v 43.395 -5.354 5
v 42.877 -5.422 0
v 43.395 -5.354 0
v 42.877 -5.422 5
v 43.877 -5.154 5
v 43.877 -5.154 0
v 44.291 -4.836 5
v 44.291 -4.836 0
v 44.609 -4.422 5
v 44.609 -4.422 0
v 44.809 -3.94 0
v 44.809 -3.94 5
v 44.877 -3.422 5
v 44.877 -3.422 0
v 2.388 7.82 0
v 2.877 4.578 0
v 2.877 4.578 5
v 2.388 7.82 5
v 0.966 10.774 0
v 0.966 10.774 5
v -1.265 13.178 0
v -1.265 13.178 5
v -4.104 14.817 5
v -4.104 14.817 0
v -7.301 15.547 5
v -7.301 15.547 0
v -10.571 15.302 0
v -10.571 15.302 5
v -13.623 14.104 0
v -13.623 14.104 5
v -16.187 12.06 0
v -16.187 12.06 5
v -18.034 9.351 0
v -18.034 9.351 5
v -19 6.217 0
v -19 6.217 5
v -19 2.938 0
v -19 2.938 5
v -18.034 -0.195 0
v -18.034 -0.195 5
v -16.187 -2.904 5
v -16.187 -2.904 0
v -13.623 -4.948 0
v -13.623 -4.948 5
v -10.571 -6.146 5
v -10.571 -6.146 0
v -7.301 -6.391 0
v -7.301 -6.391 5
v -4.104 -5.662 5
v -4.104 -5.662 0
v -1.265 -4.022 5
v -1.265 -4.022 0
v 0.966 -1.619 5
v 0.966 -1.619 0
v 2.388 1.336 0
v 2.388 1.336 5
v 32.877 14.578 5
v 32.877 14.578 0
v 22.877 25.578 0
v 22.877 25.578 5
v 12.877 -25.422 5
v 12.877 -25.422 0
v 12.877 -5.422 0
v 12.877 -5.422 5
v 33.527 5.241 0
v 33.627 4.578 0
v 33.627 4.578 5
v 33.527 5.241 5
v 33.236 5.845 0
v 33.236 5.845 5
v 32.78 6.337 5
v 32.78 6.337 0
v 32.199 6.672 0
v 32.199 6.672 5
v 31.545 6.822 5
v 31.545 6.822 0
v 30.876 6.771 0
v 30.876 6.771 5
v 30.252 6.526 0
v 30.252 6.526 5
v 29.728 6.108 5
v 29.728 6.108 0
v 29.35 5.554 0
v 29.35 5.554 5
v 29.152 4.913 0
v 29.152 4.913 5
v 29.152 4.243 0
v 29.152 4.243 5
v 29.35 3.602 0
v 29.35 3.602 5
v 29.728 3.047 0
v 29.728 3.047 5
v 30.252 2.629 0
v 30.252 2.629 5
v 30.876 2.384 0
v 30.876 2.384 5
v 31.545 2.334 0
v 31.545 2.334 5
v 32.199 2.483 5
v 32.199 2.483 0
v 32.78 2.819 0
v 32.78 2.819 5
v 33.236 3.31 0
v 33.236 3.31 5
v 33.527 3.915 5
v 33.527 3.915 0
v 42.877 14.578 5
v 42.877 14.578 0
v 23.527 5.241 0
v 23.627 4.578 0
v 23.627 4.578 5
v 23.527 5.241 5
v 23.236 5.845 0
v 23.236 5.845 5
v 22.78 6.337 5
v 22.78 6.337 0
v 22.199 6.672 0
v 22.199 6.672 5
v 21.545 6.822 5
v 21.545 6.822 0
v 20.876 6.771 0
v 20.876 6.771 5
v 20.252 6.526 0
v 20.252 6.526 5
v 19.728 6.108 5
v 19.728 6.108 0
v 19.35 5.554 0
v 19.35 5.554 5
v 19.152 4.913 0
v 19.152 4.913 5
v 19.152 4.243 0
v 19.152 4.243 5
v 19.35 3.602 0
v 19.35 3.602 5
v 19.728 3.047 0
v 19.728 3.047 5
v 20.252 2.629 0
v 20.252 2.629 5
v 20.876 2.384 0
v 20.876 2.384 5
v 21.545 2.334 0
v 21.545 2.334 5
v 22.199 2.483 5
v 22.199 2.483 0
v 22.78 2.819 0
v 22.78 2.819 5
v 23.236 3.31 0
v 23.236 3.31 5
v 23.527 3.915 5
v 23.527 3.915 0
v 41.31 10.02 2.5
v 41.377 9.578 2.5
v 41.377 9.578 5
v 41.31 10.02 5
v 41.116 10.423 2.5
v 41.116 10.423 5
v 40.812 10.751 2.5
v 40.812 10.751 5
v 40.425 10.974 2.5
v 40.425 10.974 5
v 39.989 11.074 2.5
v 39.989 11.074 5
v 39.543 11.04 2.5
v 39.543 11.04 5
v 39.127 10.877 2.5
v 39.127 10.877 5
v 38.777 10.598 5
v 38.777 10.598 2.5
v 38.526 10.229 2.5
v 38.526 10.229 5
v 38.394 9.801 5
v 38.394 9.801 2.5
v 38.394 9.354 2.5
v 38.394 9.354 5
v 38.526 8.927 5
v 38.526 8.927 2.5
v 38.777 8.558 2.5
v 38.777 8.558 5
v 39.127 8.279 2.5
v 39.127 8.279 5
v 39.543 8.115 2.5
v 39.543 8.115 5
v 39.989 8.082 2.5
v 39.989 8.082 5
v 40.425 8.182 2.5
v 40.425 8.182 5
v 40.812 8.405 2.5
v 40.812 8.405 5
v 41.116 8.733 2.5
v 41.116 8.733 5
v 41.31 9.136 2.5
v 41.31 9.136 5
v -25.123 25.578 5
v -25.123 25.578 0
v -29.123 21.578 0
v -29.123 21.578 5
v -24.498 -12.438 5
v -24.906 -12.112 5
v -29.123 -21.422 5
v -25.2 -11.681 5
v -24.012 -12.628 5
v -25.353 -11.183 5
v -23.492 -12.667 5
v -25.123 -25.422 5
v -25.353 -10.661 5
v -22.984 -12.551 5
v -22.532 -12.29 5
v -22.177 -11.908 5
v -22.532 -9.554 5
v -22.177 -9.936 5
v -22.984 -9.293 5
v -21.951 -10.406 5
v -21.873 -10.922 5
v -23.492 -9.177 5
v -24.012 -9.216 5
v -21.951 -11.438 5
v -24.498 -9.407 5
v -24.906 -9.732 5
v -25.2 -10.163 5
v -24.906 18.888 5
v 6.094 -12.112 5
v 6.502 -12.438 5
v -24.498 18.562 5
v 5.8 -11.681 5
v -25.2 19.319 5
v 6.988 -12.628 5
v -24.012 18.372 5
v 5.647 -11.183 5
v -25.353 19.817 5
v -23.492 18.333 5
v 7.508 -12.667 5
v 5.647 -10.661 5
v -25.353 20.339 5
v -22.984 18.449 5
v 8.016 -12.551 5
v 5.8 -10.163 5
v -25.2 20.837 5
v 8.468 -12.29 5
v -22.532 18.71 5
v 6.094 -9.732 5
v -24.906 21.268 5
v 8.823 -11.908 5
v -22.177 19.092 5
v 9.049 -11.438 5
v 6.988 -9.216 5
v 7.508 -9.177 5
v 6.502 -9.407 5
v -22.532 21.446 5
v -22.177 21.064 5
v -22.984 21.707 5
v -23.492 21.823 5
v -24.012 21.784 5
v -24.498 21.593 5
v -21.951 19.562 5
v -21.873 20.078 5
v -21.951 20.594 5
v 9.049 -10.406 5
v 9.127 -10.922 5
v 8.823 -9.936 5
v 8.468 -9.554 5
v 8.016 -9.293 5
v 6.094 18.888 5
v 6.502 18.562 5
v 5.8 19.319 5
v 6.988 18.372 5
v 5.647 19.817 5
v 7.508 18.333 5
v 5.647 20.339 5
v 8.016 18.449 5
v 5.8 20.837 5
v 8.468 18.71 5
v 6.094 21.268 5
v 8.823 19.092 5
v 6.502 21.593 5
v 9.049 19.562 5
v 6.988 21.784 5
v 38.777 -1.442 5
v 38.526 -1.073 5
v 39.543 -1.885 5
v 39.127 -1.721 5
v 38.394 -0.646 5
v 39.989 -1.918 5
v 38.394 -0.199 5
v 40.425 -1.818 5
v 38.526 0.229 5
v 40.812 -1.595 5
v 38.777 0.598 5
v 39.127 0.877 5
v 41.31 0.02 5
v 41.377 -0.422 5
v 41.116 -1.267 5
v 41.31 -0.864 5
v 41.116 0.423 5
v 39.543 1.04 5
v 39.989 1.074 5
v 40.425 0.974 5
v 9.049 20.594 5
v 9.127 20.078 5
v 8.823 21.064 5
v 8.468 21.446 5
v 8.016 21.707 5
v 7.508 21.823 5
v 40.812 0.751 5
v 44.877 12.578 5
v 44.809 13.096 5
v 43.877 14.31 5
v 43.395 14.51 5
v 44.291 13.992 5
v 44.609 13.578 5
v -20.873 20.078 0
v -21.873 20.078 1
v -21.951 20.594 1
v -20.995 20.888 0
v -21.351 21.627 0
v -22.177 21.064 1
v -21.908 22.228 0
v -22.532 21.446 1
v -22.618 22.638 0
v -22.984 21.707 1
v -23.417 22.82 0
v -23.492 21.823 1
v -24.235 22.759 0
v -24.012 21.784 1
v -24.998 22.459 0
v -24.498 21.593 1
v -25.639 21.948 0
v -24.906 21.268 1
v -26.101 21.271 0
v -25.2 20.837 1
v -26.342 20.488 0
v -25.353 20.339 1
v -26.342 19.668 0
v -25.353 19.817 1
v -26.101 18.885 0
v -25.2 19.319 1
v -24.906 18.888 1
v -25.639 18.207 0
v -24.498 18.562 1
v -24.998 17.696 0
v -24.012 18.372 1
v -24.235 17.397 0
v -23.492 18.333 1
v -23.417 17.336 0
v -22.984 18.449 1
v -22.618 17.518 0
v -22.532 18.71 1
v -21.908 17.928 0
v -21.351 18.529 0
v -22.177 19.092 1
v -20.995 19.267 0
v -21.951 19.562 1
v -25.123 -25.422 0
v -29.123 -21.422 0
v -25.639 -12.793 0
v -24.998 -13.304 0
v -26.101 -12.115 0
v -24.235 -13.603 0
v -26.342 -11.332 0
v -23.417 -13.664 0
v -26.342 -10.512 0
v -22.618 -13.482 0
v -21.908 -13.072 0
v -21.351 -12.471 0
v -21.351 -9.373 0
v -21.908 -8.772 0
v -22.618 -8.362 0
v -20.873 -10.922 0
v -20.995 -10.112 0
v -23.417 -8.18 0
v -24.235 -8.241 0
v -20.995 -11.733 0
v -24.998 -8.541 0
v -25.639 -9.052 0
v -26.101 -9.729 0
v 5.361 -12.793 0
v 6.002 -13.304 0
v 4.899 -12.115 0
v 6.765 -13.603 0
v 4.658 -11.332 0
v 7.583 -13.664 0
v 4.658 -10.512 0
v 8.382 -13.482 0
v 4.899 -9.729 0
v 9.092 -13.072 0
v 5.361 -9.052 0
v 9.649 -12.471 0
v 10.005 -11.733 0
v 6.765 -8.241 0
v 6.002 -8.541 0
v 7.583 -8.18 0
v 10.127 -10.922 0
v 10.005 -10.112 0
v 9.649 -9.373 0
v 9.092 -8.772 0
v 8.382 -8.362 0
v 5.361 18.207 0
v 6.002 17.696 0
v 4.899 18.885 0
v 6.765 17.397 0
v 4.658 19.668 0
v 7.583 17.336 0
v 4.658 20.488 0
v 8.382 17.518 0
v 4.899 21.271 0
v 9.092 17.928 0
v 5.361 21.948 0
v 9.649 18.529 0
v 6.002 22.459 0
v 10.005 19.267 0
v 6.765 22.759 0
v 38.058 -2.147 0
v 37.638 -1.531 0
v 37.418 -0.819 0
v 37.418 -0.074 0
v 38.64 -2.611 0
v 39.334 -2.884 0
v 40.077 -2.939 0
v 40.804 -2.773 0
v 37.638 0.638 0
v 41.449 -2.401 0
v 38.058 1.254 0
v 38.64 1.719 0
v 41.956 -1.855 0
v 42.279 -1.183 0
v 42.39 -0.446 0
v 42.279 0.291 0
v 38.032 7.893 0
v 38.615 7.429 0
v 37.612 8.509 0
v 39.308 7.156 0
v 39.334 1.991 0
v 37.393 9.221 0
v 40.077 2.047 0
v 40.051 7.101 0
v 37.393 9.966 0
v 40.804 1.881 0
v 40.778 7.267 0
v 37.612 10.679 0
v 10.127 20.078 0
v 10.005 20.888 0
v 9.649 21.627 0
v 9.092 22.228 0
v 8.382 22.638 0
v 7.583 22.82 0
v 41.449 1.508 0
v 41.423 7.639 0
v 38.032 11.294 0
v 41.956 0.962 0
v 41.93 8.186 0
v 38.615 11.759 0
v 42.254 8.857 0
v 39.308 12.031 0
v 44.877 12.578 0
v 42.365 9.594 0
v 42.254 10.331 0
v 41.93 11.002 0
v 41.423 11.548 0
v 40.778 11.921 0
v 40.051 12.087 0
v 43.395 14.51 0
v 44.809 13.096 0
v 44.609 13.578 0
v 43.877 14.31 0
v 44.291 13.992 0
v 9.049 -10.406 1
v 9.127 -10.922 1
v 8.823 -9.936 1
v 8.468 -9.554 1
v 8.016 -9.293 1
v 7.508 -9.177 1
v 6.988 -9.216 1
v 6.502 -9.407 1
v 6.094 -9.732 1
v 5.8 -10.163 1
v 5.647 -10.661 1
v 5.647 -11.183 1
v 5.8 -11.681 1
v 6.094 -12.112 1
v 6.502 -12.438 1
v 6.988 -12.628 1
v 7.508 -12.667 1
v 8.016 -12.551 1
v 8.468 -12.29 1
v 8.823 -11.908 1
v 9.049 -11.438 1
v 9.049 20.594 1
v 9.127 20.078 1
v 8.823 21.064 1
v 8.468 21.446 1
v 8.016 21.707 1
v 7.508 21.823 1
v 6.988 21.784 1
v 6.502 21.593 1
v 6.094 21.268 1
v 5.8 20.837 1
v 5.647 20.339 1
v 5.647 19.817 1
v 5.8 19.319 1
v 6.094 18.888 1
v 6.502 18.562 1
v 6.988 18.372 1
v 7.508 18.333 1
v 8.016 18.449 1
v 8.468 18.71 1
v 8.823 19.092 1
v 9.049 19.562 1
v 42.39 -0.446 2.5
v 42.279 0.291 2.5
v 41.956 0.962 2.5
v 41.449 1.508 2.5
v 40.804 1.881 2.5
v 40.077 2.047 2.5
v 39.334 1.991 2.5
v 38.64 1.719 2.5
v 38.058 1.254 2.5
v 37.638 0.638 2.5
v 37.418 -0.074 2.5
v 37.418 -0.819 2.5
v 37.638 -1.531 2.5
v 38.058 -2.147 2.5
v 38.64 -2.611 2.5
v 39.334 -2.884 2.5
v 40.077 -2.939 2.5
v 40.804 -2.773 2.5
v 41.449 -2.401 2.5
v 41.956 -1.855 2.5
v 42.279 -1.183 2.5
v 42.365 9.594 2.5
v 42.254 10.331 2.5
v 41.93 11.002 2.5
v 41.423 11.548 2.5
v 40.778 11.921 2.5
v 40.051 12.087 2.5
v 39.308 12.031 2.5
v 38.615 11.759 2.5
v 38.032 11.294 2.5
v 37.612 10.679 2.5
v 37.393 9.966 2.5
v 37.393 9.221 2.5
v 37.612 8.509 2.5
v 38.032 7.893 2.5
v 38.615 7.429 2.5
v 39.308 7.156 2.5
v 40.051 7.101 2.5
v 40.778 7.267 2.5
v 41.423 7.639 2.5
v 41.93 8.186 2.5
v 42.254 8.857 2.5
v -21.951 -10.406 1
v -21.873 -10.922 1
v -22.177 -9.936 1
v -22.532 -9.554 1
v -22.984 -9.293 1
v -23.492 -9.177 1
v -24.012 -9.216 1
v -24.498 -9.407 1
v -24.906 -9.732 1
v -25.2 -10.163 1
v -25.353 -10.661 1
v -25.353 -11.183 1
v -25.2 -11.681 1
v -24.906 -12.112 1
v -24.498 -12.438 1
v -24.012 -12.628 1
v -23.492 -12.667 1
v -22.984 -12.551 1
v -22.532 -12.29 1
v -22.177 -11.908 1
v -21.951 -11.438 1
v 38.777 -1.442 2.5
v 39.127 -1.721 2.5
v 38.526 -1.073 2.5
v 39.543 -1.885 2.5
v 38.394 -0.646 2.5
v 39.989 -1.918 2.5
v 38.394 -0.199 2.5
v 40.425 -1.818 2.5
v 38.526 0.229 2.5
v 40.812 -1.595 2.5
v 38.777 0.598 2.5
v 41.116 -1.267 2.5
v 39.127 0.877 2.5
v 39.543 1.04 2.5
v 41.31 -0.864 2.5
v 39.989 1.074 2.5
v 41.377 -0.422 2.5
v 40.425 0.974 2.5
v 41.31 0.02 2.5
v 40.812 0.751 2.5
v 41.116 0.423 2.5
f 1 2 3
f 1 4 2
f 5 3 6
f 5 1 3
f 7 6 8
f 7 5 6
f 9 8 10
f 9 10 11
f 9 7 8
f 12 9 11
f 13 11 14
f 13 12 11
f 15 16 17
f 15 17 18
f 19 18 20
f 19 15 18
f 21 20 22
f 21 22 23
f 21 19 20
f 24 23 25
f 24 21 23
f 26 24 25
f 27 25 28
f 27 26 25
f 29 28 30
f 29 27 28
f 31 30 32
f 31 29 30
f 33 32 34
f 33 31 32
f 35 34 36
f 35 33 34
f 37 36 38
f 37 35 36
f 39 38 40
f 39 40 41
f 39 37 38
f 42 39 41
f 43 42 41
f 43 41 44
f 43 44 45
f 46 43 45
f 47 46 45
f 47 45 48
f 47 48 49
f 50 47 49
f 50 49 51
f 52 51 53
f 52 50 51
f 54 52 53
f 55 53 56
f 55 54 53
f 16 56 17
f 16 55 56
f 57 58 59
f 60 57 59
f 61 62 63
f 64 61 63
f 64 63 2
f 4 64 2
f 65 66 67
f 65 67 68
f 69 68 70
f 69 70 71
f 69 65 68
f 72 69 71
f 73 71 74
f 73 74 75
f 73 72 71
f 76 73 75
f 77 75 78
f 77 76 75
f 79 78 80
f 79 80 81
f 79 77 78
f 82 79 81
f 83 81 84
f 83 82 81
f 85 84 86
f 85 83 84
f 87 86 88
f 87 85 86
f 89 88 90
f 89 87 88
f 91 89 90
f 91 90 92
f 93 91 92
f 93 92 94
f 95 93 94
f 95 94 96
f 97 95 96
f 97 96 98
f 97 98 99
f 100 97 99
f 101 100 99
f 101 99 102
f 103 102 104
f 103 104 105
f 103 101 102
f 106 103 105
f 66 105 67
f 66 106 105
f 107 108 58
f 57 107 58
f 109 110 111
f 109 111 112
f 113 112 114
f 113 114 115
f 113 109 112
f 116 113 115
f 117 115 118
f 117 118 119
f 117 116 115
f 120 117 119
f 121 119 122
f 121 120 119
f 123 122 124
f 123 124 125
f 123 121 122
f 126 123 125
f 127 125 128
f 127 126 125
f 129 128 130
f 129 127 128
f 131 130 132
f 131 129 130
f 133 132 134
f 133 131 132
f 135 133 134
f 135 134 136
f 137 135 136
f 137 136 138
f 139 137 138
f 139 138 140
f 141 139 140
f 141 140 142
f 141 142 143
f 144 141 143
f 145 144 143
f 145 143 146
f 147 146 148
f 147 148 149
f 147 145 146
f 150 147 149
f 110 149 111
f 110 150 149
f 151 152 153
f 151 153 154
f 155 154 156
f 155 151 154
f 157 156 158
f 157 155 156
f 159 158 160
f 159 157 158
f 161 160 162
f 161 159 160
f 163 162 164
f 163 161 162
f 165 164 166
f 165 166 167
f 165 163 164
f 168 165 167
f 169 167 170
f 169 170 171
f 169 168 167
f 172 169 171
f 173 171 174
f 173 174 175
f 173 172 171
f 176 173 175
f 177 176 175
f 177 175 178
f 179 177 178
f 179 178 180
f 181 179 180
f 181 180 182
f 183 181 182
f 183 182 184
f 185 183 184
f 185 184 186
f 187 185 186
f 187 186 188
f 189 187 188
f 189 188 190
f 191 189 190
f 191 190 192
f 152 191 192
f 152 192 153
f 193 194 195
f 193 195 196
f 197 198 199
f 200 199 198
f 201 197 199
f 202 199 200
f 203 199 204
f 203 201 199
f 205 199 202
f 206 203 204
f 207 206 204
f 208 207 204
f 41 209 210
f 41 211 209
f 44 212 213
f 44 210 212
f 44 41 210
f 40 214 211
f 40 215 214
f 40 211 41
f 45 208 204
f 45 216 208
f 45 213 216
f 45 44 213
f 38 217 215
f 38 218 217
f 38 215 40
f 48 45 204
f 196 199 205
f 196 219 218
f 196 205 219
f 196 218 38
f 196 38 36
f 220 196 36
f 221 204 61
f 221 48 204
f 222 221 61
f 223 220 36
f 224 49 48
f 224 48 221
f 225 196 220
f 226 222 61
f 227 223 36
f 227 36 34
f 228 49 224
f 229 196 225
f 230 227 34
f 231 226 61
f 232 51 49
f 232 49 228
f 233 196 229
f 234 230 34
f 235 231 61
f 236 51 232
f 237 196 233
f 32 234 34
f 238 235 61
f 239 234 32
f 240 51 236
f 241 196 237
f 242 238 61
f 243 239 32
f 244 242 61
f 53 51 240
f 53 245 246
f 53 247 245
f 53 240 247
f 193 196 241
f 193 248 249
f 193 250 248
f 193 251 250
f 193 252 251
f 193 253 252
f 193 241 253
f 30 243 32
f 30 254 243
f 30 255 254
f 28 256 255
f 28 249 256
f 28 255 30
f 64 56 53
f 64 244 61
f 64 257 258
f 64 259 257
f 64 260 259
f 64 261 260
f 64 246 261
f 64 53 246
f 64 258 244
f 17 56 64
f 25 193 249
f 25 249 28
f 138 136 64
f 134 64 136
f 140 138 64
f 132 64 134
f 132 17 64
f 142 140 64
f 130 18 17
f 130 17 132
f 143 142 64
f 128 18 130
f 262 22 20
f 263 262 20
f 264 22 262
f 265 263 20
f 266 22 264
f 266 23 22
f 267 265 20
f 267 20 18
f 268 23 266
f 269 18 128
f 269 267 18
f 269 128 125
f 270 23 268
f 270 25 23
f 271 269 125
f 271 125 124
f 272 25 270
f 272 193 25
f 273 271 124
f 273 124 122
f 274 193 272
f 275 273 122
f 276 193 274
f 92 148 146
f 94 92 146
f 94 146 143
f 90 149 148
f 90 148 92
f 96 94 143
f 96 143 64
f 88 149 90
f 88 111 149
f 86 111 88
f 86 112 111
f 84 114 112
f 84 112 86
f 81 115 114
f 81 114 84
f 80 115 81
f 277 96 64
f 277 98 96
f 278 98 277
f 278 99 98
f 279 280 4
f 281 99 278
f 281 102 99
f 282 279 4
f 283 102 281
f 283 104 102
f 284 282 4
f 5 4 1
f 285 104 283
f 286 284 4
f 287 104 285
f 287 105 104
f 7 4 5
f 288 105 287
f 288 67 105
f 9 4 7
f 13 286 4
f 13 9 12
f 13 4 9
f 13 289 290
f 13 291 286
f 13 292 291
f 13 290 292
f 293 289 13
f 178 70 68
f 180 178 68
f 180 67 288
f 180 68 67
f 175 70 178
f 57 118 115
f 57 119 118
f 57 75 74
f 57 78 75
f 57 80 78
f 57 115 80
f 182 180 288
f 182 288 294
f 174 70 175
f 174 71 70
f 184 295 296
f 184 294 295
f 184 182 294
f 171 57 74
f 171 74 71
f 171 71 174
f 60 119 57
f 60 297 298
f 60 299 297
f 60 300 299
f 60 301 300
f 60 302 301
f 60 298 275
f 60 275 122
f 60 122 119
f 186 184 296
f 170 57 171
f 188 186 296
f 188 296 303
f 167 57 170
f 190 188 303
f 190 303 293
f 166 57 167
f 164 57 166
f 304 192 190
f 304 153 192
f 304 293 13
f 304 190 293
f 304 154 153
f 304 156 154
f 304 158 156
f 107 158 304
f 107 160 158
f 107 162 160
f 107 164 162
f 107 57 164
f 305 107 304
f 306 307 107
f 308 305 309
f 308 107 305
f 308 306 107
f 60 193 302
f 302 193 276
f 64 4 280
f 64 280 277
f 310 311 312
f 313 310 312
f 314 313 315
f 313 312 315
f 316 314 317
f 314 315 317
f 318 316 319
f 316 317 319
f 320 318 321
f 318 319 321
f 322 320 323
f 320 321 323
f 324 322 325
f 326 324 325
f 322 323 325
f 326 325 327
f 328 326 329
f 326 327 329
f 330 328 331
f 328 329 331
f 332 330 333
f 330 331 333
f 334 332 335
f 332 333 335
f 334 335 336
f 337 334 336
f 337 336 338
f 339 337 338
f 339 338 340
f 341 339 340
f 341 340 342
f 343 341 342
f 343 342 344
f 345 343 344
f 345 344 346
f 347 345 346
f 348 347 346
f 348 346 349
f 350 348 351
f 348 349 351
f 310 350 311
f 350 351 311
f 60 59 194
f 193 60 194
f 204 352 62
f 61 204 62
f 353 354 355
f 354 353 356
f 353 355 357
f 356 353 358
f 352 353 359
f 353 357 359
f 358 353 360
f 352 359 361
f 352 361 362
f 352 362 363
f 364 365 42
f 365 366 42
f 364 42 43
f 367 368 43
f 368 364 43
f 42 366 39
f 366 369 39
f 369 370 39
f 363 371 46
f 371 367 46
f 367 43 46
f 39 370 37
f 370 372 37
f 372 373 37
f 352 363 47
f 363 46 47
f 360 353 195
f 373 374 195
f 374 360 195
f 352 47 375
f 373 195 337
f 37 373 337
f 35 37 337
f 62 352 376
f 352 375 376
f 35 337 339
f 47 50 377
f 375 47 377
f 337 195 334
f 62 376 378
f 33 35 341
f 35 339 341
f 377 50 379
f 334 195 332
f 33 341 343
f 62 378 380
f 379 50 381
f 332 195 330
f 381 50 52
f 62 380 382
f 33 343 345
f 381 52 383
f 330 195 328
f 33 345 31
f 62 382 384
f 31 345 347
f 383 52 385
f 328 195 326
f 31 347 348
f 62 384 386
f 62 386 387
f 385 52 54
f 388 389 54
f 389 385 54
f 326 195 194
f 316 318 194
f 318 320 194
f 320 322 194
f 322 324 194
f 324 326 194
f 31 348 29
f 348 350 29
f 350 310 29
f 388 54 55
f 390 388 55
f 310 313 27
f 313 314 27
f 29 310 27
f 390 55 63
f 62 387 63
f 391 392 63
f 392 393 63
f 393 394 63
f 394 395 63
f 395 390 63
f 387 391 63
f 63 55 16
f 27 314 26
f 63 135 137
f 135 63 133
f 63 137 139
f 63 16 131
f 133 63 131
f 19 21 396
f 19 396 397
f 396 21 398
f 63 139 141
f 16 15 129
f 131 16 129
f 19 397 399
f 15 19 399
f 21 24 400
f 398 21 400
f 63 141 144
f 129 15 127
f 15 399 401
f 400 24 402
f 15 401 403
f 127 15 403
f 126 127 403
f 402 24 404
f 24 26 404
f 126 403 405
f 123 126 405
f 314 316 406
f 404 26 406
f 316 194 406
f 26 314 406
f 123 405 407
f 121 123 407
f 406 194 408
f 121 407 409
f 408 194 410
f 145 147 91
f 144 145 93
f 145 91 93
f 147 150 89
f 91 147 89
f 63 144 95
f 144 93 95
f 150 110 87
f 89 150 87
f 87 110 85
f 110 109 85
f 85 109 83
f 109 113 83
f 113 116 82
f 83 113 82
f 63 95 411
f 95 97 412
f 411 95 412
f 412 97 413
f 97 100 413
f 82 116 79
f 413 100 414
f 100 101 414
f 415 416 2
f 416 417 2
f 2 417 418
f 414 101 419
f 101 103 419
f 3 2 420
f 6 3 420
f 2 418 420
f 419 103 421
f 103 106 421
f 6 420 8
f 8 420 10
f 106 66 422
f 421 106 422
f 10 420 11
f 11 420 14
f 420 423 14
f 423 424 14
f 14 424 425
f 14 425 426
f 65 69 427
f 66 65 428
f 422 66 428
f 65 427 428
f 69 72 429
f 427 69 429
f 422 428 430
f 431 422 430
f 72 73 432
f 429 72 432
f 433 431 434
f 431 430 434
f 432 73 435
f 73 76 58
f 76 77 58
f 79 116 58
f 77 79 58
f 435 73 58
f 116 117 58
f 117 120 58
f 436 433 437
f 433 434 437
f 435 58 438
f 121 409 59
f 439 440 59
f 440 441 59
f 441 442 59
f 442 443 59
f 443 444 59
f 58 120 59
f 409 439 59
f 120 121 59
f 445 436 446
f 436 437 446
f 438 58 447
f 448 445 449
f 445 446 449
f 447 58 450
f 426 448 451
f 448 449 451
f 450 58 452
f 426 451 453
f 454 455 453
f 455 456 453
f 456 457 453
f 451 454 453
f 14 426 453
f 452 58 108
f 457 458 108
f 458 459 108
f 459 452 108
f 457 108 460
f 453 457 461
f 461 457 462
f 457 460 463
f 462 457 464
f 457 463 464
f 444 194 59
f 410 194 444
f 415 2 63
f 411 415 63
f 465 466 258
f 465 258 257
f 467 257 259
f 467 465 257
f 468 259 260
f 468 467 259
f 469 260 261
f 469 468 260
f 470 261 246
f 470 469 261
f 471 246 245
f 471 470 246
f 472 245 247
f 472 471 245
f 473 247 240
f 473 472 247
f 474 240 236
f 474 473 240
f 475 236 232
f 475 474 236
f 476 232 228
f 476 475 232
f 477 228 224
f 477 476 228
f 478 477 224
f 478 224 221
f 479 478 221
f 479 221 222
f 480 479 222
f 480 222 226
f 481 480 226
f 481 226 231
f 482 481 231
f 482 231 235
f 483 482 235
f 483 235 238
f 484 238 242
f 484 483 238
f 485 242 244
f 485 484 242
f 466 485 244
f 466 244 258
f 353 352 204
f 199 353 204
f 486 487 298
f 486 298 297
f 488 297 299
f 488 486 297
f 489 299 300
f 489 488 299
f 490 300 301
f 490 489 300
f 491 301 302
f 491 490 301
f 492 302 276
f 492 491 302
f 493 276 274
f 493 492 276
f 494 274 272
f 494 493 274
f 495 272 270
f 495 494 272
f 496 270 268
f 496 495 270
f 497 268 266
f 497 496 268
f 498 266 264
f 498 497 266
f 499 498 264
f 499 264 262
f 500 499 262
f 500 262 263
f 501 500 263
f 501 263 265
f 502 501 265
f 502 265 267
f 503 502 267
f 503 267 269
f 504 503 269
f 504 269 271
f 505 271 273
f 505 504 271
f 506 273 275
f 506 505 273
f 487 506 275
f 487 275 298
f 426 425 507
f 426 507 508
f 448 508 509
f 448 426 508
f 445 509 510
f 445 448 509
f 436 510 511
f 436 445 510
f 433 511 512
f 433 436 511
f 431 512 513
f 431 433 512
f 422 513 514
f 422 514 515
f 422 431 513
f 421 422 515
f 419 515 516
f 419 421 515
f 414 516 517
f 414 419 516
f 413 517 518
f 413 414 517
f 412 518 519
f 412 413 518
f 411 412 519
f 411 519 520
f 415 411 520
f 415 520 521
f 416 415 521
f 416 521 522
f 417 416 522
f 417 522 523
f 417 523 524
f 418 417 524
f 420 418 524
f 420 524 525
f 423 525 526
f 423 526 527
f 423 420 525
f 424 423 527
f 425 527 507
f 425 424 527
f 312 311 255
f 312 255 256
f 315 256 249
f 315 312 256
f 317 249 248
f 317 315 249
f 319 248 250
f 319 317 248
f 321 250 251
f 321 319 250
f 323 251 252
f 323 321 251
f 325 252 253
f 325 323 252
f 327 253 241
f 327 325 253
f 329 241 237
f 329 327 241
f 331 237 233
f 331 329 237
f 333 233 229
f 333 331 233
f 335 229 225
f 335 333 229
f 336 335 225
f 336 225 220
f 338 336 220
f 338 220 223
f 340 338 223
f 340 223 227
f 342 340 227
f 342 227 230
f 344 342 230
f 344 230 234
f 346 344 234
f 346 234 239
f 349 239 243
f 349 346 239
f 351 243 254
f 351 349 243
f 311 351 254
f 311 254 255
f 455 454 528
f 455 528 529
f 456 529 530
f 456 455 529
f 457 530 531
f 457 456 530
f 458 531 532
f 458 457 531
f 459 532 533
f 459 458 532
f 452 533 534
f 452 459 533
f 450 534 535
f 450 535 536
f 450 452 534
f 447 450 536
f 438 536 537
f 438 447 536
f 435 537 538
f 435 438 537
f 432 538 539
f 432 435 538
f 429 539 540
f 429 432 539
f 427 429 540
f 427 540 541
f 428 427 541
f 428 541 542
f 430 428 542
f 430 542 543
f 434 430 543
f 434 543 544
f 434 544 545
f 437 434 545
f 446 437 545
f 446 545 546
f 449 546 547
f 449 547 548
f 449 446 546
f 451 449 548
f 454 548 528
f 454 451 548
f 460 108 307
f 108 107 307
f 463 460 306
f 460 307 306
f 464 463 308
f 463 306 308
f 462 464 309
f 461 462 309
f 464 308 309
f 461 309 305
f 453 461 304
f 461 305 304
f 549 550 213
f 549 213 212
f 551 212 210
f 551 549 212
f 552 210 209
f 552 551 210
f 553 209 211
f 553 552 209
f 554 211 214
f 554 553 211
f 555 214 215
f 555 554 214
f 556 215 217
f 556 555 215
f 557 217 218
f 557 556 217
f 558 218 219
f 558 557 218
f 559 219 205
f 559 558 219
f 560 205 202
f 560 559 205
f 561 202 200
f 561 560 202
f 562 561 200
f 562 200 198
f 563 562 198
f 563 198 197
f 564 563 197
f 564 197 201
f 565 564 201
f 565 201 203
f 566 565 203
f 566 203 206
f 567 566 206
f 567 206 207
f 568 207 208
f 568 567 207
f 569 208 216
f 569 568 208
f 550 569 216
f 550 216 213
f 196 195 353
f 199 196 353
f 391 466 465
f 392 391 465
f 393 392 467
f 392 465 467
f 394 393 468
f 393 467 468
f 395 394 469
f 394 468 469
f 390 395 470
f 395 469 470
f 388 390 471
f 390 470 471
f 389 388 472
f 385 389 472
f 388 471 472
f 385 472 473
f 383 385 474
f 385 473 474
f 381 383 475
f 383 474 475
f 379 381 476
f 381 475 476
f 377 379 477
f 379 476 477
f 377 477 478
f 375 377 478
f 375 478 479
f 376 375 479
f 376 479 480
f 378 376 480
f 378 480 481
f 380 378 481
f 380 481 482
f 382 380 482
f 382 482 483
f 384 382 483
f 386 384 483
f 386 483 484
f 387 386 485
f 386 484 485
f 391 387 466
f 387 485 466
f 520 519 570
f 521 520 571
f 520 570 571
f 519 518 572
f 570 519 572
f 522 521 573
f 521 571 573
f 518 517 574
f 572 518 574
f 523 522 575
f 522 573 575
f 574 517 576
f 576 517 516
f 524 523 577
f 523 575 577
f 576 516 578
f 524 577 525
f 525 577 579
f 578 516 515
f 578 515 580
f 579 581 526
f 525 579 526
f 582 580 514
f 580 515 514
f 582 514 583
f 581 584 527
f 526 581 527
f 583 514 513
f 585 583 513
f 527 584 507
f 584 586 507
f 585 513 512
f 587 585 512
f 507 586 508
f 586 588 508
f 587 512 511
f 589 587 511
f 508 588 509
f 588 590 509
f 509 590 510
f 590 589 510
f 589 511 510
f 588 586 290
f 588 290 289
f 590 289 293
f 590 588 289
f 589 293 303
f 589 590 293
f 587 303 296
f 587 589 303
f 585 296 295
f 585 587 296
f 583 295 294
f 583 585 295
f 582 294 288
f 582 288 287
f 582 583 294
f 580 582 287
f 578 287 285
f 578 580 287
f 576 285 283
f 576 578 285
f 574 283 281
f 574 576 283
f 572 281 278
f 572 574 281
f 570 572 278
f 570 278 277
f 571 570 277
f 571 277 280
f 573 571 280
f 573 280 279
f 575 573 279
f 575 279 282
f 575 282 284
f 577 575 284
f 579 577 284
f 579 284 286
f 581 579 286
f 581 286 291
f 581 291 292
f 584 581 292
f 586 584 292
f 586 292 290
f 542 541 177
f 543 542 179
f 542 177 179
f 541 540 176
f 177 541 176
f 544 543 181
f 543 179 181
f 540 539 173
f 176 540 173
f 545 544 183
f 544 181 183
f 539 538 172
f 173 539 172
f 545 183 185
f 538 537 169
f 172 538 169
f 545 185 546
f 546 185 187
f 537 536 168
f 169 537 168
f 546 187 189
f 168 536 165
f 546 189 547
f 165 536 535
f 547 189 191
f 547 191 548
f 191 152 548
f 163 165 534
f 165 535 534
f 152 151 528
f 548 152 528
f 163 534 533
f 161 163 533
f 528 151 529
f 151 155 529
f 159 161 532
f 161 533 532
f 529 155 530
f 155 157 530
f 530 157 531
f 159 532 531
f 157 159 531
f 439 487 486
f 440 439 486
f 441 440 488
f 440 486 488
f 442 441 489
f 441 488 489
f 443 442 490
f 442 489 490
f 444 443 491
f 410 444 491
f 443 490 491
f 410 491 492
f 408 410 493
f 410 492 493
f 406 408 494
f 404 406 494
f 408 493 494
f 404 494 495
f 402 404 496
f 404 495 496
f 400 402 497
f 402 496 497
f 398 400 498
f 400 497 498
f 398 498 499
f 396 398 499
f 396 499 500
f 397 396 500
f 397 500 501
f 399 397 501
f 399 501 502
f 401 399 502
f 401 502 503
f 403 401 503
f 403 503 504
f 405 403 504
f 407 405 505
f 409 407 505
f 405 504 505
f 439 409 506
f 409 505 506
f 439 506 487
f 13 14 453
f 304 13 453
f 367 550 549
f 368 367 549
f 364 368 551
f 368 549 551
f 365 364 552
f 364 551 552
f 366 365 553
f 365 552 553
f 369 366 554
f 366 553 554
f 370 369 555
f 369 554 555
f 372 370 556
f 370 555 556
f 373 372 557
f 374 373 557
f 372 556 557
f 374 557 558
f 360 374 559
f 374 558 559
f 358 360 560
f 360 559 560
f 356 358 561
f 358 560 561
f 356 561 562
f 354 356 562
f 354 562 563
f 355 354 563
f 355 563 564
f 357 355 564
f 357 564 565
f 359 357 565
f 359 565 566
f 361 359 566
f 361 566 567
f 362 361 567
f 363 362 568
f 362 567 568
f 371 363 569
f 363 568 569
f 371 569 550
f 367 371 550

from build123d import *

# Parameters (mm, degrees)
F0_R     = 1.75
F0_R_2   = 11
F0_R_3   = 1.5
F0_R_4   = 2.25
F1_DEPTH = 5
F2_R     = 2.5
F2_R_2   = 1.5
F3_DEPTH = 2.5
F4_SIZE  = 1
F5_SIZE  = 4
F6_R     = 2


with BuildPart() as f1:
    # F0 (on Top) → F1 (new body)
    with BuildSketch(Plane.XY):
        Polygon((12.877052, 25.577868), (-29.122948, 25.577868), (-29.122948, -25.422132), (12.877052, -25.422132), (12.877052, -5.422132), align=None)
        with Locations((-23.622948, -10.922132)):
            Circle(F0_R, mode=Mode.SUBTRACT)
        with Locations((7.377052, -10.922132)):
            Circle(F0_R, mode=Mode.SUBTRACT)
        with Locations((-8.122948, 4.577868)):
            Circle(F0_R_2, mode=Mode.SUBTRACT)
        with Locations((-23.622948, 20.077868)):
            Circle(F0_R, mode=Mode.SUBTRACT)
        with Locations((7.377052, 20.077868)):
            Circle(F0_R, mode=Mode.SUBTRACT)
        Polygon((22.877052, 25.577868), (12.877052, 25.577868), (12.877052, -5.422132), (44.877052, -5.422132), (44.877052, 14.577868), (32.877052, 14.577868), align=None)
        with Locations((39.877052, -0.422132)):
            Circle(F0_R_3, mode=Mode.SUBTRACT)
        with Locations((21.377052, 4.577868)):
            Circle(F0_R_4, mode=Mode.SUBTRACT)
        with Locations((31.377052, 4.577868)):
            Circle(F0_R_4, mode=Mode.SUBTRACT)
        with Locations((39.877052, 9.577868)):
            Circle(F0_R_3, mode=Mode.SUBTRACT)
    extrude(amount=F1_DEPTH)

    # F2 (on face) → F3 (cut)
    with BuildSketch(Plane.XY):
        with Locations((39.890356, -0.446285)):
            Circle(F2_R)
        with Locations((39.877052, -0.422132)):
            Circle(F2_R_2, mode=Mode.SUBTRACT)
        with Locations((39.864622, 9.593817)):
            Circle(F2_R)
    extrude(amount=F3_DEPTH, mode=Mode.SUBTRACT)

    # F4
    f4_edges = [f1.edges().sort_by_distance(p)[0] for p in [
        (-25.372948, 20.077868, 0),
        (5.627052, 20.077868, 0),
        (5.627052, -10.922132, 0),
        (-25.372948, -10.922132, 0),
    ]]
    chamfer(f4_edges, length=F4_SIZE)

    # F5
    f5_edges = [f1.edges().sort_by_distance(p)[0] for p in [
        (-29.122948, 25.577868, 2.5),
        (-29.122948, -25.422132, 2.5),
    ]]
    chamfer(f5_edges, length=F5_SIZE)

    # F6
    f6_edges = [f1.edges().sort_by_distance(p)[0] for p in [
        (44.877052, 14.577868, 2.5),
        (44.877052, -5.422132, 2.5),
    ]]
    fillet(f6_edges, radius=F6_R)


solid = f1.part
